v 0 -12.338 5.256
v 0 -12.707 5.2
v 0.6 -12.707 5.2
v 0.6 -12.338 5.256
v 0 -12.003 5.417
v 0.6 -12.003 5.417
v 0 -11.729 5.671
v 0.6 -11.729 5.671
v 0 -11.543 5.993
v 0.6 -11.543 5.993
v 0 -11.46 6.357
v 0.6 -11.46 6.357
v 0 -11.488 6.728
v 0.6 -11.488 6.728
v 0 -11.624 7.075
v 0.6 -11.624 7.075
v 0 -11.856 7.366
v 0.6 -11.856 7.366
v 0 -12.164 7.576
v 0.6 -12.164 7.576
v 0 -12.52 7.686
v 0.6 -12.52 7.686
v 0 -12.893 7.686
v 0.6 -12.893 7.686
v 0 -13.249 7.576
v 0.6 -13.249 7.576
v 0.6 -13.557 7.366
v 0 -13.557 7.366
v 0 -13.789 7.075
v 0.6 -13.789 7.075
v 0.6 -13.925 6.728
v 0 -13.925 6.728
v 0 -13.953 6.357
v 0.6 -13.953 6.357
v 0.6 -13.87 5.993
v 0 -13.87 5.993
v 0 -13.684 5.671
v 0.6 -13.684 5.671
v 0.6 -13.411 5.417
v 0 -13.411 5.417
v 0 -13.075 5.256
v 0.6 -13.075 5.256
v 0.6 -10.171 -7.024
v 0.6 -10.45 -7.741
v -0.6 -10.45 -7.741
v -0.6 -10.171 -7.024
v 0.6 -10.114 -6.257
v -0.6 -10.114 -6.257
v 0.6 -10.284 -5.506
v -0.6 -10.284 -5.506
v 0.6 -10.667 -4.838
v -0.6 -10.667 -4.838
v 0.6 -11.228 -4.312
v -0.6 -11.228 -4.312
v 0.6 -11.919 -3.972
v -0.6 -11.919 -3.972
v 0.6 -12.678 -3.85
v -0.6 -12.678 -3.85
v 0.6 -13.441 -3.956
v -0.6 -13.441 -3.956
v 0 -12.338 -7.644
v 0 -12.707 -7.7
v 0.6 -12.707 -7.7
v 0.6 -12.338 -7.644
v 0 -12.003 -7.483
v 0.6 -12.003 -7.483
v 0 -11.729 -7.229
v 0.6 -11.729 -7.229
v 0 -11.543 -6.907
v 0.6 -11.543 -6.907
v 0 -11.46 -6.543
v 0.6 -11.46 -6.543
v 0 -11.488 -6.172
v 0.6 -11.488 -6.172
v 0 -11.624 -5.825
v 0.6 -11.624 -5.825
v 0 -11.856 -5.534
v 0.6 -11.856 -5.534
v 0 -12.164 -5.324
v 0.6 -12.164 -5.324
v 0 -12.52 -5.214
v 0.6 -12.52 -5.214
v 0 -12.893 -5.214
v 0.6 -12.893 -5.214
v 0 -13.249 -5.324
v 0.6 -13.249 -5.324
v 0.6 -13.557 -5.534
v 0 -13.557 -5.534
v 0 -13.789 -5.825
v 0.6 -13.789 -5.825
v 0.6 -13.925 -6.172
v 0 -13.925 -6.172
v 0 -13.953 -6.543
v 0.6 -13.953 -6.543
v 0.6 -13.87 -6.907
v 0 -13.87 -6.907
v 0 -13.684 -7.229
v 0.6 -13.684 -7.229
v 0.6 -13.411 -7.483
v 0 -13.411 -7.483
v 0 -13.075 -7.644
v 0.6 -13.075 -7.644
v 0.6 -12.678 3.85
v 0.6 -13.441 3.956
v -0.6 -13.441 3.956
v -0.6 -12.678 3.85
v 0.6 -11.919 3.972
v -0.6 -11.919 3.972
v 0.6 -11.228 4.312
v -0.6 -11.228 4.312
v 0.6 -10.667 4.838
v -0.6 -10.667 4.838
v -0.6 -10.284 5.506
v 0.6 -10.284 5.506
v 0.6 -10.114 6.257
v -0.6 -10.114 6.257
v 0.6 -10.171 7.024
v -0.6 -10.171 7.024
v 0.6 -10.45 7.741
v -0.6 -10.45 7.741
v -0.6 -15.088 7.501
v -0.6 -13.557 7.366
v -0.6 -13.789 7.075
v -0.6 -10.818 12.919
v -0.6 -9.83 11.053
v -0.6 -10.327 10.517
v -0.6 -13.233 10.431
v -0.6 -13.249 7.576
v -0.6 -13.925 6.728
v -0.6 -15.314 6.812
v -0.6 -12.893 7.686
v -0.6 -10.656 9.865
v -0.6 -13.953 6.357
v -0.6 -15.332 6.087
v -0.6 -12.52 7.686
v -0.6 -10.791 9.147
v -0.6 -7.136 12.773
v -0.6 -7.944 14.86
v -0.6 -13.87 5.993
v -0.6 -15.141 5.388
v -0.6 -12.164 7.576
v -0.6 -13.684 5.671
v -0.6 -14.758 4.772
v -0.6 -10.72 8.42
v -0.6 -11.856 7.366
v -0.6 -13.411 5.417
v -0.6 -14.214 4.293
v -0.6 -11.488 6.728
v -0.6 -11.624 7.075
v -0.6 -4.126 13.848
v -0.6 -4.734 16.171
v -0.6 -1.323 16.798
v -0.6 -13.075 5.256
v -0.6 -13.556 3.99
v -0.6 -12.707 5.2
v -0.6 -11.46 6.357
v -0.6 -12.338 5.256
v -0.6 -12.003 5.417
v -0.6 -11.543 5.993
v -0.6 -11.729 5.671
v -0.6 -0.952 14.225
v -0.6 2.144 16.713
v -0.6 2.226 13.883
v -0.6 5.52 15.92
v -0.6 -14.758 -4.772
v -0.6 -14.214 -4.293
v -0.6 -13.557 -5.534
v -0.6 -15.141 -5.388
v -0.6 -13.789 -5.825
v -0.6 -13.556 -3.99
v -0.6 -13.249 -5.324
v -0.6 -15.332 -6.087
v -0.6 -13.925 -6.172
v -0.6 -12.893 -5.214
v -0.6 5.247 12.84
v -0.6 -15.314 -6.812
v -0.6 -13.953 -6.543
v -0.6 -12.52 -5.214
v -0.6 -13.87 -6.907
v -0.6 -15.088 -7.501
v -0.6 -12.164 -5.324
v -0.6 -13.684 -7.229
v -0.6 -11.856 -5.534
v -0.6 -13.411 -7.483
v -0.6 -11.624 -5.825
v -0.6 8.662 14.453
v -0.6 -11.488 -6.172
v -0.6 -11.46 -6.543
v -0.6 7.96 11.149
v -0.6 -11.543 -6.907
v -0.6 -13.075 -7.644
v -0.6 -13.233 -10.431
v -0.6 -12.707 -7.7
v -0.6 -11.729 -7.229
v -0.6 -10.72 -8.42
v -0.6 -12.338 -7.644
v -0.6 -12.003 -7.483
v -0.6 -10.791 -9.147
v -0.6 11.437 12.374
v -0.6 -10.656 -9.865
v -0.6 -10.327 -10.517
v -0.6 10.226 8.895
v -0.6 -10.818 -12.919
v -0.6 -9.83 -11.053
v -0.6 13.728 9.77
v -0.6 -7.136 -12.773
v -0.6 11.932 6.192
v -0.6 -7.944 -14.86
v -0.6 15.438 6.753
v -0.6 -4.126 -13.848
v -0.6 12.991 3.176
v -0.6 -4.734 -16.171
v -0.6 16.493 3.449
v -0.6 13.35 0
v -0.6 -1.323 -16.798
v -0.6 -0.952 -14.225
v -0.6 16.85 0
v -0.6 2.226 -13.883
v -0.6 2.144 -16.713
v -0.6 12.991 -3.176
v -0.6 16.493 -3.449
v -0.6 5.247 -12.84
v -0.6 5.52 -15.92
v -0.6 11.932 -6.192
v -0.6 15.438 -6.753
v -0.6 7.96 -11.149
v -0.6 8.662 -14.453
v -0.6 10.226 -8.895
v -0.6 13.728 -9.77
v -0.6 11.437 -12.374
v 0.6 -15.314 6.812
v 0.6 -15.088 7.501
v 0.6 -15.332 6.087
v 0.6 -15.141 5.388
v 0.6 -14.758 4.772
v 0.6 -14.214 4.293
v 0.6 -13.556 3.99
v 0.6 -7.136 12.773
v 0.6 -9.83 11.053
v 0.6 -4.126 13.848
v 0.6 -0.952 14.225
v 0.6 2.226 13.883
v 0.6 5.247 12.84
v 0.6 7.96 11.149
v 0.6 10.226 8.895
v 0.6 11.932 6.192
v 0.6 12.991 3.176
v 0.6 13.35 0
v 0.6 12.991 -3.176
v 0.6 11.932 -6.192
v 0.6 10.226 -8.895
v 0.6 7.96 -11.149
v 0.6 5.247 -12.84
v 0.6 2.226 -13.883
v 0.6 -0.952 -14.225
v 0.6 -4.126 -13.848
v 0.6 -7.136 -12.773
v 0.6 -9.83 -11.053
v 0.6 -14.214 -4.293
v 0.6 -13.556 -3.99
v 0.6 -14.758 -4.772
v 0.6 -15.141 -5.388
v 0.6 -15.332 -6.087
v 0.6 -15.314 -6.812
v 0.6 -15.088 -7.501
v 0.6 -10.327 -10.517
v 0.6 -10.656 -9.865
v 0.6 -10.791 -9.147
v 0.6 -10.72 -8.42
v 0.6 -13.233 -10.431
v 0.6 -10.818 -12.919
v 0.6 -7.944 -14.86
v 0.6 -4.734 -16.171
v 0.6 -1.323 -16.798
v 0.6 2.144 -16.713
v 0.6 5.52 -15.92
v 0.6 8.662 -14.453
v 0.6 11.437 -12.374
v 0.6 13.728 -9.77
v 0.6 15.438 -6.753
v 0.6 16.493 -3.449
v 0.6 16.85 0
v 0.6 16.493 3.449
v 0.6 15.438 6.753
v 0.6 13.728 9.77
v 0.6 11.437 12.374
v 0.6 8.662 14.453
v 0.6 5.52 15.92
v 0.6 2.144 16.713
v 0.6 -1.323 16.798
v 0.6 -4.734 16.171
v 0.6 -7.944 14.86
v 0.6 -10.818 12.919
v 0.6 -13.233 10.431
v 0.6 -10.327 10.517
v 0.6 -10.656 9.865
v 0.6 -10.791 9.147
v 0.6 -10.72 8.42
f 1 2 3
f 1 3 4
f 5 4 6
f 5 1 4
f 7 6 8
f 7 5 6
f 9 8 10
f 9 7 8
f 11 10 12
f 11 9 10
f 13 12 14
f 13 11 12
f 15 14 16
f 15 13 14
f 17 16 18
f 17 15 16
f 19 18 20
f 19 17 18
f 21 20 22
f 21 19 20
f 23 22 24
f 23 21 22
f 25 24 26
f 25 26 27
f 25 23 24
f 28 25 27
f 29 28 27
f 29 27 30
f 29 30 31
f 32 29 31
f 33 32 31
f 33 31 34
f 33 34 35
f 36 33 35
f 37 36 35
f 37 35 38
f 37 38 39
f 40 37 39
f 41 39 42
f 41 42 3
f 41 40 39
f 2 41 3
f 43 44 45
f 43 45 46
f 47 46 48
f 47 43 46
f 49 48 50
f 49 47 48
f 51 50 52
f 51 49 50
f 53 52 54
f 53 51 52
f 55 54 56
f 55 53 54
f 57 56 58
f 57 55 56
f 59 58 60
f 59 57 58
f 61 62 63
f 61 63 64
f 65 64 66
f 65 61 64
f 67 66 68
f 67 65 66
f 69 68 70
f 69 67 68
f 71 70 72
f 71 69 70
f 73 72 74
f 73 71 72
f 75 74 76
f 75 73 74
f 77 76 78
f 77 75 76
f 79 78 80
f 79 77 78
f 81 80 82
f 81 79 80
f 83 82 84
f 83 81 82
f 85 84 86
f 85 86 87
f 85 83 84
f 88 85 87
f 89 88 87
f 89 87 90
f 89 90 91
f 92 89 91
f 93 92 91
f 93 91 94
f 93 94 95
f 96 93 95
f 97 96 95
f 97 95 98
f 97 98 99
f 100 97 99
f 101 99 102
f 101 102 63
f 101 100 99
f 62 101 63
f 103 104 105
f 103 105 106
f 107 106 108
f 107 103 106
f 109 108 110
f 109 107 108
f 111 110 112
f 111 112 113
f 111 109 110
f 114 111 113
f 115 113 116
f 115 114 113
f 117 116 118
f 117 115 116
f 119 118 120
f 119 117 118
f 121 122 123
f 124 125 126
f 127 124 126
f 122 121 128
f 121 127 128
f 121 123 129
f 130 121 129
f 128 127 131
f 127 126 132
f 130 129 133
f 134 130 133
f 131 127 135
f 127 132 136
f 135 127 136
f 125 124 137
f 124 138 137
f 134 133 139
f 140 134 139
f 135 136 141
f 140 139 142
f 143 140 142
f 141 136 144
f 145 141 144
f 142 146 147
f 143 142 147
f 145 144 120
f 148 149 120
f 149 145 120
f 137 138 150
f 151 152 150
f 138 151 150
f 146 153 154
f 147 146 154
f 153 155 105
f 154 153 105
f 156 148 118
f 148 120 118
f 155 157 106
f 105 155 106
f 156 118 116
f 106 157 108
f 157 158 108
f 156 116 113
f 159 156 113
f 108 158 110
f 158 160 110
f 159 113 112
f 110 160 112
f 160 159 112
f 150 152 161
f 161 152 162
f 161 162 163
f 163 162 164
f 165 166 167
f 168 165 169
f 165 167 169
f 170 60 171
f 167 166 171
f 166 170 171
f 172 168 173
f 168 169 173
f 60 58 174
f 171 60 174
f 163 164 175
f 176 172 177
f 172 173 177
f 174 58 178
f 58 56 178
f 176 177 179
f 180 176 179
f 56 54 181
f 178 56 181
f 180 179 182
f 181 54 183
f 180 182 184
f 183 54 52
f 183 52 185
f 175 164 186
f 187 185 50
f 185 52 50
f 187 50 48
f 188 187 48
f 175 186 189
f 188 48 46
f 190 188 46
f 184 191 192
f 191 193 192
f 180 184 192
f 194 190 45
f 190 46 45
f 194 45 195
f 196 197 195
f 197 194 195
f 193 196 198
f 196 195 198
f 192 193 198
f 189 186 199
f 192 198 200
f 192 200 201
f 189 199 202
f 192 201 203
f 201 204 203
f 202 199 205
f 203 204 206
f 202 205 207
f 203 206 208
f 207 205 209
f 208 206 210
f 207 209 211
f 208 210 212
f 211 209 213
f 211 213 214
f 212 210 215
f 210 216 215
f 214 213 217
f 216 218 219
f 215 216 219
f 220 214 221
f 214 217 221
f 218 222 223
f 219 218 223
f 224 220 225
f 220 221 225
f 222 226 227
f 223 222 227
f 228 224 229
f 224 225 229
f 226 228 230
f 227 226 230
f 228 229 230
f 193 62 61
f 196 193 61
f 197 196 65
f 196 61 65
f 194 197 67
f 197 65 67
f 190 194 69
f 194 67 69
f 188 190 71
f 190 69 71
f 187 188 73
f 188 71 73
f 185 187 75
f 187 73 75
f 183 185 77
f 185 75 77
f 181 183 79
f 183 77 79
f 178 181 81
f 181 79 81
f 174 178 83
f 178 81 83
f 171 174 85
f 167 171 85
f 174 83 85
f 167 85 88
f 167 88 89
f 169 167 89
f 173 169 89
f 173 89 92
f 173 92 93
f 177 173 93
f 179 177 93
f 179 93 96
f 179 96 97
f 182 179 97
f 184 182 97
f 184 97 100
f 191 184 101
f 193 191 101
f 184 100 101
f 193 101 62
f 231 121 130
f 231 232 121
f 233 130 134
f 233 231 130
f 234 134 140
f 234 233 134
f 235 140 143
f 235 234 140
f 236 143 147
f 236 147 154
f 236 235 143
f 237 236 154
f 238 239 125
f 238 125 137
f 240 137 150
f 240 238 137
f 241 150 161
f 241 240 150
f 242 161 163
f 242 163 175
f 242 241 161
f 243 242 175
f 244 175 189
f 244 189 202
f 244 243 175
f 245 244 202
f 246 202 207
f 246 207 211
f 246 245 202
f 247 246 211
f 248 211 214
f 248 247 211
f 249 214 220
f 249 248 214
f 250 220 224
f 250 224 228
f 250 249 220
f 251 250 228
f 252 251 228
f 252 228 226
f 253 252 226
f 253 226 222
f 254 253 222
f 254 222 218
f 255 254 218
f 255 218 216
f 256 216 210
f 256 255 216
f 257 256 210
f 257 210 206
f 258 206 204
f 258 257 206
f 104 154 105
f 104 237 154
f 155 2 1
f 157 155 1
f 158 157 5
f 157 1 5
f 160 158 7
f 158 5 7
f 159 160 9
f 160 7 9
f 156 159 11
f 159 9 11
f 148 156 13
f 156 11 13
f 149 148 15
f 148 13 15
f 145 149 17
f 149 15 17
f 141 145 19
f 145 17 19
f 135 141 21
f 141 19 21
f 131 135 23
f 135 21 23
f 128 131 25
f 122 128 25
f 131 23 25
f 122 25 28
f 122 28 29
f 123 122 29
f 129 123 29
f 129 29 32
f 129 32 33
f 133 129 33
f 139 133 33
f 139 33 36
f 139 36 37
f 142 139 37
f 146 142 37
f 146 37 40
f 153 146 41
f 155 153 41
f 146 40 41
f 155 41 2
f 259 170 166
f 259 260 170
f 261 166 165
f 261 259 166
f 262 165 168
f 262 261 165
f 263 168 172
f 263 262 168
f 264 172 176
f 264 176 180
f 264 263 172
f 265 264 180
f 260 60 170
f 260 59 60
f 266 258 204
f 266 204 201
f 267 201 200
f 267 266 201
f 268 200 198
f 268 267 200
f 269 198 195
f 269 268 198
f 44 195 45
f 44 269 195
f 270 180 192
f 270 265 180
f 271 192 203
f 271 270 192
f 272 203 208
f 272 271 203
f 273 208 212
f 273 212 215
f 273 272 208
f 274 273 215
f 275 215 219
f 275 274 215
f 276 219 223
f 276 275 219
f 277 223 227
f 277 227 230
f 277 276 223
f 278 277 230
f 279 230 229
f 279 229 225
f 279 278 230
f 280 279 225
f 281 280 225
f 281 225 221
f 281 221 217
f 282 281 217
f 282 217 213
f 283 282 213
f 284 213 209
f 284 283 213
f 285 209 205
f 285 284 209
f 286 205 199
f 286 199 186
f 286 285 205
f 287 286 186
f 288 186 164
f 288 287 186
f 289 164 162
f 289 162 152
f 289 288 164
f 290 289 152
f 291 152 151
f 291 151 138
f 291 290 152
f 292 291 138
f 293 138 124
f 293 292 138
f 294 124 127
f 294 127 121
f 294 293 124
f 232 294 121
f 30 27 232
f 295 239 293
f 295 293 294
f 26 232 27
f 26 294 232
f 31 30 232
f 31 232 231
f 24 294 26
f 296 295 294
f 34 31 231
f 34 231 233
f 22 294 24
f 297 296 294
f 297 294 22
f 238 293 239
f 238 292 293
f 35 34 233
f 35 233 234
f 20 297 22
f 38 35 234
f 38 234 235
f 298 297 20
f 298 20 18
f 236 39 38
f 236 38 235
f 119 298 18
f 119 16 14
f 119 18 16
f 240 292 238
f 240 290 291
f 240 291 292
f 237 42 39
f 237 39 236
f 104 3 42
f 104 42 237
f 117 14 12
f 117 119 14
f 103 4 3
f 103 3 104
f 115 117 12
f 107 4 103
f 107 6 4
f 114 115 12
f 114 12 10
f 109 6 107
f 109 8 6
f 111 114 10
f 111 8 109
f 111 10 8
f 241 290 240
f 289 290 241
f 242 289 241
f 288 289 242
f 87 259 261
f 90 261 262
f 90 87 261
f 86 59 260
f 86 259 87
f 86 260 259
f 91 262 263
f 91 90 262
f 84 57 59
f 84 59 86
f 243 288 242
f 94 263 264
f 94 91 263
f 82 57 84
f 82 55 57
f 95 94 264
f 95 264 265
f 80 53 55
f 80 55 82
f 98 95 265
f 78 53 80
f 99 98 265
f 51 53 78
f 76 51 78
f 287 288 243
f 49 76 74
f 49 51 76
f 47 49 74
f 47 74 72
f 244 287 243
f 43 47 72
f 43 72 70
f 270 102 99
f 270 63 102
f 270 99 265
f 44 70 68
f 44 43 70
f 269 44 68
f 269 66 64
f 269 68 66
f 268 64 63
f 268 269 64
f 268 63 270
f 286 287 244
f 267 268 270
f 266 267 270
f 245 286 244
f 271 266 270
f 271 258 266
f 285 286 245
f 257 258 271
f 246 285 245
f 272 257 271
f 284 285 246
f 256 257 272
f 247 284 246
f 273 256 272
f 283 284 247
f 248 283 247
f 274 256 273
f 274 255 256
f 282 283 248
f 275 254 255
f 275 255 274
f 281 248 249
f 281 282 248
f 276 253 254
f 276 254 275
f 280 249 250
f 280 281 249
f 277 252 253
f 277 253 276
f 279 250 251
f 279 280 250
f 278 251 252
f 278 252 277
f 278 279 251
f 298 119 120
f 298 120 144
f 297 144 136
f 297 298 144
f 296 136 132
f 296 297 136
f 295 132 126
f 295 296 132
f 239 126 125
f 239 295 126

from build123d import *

# Parameters (mm, degrees)
EXTRUDE_1_DEPTH      = 0.6
EXTRUDE_1_DEPTH_BACK = 0.6
SKETCH_1_R           = 1.25


with BuildPart() as part:
    # ｽｹｯﾁ1 → ﾎﾞｽ - 押し出し1 (new, two sides: drawn at the far end of the back side and taken through both)
    with BuildSketch(Plane(origin=(0, 0, 0), x_dir=(0, 0, -1), z_dir=(1, 0, 0)).offset(-EXTRUDE_1_DEPTH_BACK)):
        with BuildLine():
            Line((-3.989591726, -13.555650403), (-3.955781017, -13.440769939))
            ThreePointArc((-3.955781017, -13.440769939), (-4.838154074, -10.666604704), (-7.741194161, -10.449963955))
            ThreePointArc((-7.741194161, -10.449963955), (-9.510855368, -10.748832352), (-11.052535247, -9.830003608))
            ThreePointArc((-11.052535247, -9.830003608), (-1.19e-07, 13.35), (11.052535397, -9.830003423))
            ThreePointArc((11.052535397, -9.830003423), (9.510855453, -10.748832336), (7.741194103, -10.449963921))
            ThreePointArc((7.741194103, -10.449963921), (4.838154048, -10.666604724), (3.955781017, -13.440769939))
            Line((3.955781017, -13.440769939), (3.989591726, -13.555650403))
            ThreePointArc((3.989591726, -13.555650403), (5.387658916, -15.140997106), (7.500750152, -15.088447473))
            ThreePointArc((7.500750152, -15.088447473), (0, 16.85), (-7.500750152, -15.088447473))
            ThreePointArc((-7.500750152, -15.088447473), (-5.387658916, -15.140997106), (-3.989591726, -13.555650403))
        make_face()
        with Locations((6.45, -12.706691151)):
            Circle(SKETCH_1_R, mode=Mode.SUBTRACT)
        with Locations((-6.45, -12.706691151)):
            Circle(SKETCH_1_R, mode=Mode.SUBTRACT)
    extrude(amount=EXTRUDE_1_DEPTH + EXTRUDE_1_DEPTH_BACK)


solid = part.part
